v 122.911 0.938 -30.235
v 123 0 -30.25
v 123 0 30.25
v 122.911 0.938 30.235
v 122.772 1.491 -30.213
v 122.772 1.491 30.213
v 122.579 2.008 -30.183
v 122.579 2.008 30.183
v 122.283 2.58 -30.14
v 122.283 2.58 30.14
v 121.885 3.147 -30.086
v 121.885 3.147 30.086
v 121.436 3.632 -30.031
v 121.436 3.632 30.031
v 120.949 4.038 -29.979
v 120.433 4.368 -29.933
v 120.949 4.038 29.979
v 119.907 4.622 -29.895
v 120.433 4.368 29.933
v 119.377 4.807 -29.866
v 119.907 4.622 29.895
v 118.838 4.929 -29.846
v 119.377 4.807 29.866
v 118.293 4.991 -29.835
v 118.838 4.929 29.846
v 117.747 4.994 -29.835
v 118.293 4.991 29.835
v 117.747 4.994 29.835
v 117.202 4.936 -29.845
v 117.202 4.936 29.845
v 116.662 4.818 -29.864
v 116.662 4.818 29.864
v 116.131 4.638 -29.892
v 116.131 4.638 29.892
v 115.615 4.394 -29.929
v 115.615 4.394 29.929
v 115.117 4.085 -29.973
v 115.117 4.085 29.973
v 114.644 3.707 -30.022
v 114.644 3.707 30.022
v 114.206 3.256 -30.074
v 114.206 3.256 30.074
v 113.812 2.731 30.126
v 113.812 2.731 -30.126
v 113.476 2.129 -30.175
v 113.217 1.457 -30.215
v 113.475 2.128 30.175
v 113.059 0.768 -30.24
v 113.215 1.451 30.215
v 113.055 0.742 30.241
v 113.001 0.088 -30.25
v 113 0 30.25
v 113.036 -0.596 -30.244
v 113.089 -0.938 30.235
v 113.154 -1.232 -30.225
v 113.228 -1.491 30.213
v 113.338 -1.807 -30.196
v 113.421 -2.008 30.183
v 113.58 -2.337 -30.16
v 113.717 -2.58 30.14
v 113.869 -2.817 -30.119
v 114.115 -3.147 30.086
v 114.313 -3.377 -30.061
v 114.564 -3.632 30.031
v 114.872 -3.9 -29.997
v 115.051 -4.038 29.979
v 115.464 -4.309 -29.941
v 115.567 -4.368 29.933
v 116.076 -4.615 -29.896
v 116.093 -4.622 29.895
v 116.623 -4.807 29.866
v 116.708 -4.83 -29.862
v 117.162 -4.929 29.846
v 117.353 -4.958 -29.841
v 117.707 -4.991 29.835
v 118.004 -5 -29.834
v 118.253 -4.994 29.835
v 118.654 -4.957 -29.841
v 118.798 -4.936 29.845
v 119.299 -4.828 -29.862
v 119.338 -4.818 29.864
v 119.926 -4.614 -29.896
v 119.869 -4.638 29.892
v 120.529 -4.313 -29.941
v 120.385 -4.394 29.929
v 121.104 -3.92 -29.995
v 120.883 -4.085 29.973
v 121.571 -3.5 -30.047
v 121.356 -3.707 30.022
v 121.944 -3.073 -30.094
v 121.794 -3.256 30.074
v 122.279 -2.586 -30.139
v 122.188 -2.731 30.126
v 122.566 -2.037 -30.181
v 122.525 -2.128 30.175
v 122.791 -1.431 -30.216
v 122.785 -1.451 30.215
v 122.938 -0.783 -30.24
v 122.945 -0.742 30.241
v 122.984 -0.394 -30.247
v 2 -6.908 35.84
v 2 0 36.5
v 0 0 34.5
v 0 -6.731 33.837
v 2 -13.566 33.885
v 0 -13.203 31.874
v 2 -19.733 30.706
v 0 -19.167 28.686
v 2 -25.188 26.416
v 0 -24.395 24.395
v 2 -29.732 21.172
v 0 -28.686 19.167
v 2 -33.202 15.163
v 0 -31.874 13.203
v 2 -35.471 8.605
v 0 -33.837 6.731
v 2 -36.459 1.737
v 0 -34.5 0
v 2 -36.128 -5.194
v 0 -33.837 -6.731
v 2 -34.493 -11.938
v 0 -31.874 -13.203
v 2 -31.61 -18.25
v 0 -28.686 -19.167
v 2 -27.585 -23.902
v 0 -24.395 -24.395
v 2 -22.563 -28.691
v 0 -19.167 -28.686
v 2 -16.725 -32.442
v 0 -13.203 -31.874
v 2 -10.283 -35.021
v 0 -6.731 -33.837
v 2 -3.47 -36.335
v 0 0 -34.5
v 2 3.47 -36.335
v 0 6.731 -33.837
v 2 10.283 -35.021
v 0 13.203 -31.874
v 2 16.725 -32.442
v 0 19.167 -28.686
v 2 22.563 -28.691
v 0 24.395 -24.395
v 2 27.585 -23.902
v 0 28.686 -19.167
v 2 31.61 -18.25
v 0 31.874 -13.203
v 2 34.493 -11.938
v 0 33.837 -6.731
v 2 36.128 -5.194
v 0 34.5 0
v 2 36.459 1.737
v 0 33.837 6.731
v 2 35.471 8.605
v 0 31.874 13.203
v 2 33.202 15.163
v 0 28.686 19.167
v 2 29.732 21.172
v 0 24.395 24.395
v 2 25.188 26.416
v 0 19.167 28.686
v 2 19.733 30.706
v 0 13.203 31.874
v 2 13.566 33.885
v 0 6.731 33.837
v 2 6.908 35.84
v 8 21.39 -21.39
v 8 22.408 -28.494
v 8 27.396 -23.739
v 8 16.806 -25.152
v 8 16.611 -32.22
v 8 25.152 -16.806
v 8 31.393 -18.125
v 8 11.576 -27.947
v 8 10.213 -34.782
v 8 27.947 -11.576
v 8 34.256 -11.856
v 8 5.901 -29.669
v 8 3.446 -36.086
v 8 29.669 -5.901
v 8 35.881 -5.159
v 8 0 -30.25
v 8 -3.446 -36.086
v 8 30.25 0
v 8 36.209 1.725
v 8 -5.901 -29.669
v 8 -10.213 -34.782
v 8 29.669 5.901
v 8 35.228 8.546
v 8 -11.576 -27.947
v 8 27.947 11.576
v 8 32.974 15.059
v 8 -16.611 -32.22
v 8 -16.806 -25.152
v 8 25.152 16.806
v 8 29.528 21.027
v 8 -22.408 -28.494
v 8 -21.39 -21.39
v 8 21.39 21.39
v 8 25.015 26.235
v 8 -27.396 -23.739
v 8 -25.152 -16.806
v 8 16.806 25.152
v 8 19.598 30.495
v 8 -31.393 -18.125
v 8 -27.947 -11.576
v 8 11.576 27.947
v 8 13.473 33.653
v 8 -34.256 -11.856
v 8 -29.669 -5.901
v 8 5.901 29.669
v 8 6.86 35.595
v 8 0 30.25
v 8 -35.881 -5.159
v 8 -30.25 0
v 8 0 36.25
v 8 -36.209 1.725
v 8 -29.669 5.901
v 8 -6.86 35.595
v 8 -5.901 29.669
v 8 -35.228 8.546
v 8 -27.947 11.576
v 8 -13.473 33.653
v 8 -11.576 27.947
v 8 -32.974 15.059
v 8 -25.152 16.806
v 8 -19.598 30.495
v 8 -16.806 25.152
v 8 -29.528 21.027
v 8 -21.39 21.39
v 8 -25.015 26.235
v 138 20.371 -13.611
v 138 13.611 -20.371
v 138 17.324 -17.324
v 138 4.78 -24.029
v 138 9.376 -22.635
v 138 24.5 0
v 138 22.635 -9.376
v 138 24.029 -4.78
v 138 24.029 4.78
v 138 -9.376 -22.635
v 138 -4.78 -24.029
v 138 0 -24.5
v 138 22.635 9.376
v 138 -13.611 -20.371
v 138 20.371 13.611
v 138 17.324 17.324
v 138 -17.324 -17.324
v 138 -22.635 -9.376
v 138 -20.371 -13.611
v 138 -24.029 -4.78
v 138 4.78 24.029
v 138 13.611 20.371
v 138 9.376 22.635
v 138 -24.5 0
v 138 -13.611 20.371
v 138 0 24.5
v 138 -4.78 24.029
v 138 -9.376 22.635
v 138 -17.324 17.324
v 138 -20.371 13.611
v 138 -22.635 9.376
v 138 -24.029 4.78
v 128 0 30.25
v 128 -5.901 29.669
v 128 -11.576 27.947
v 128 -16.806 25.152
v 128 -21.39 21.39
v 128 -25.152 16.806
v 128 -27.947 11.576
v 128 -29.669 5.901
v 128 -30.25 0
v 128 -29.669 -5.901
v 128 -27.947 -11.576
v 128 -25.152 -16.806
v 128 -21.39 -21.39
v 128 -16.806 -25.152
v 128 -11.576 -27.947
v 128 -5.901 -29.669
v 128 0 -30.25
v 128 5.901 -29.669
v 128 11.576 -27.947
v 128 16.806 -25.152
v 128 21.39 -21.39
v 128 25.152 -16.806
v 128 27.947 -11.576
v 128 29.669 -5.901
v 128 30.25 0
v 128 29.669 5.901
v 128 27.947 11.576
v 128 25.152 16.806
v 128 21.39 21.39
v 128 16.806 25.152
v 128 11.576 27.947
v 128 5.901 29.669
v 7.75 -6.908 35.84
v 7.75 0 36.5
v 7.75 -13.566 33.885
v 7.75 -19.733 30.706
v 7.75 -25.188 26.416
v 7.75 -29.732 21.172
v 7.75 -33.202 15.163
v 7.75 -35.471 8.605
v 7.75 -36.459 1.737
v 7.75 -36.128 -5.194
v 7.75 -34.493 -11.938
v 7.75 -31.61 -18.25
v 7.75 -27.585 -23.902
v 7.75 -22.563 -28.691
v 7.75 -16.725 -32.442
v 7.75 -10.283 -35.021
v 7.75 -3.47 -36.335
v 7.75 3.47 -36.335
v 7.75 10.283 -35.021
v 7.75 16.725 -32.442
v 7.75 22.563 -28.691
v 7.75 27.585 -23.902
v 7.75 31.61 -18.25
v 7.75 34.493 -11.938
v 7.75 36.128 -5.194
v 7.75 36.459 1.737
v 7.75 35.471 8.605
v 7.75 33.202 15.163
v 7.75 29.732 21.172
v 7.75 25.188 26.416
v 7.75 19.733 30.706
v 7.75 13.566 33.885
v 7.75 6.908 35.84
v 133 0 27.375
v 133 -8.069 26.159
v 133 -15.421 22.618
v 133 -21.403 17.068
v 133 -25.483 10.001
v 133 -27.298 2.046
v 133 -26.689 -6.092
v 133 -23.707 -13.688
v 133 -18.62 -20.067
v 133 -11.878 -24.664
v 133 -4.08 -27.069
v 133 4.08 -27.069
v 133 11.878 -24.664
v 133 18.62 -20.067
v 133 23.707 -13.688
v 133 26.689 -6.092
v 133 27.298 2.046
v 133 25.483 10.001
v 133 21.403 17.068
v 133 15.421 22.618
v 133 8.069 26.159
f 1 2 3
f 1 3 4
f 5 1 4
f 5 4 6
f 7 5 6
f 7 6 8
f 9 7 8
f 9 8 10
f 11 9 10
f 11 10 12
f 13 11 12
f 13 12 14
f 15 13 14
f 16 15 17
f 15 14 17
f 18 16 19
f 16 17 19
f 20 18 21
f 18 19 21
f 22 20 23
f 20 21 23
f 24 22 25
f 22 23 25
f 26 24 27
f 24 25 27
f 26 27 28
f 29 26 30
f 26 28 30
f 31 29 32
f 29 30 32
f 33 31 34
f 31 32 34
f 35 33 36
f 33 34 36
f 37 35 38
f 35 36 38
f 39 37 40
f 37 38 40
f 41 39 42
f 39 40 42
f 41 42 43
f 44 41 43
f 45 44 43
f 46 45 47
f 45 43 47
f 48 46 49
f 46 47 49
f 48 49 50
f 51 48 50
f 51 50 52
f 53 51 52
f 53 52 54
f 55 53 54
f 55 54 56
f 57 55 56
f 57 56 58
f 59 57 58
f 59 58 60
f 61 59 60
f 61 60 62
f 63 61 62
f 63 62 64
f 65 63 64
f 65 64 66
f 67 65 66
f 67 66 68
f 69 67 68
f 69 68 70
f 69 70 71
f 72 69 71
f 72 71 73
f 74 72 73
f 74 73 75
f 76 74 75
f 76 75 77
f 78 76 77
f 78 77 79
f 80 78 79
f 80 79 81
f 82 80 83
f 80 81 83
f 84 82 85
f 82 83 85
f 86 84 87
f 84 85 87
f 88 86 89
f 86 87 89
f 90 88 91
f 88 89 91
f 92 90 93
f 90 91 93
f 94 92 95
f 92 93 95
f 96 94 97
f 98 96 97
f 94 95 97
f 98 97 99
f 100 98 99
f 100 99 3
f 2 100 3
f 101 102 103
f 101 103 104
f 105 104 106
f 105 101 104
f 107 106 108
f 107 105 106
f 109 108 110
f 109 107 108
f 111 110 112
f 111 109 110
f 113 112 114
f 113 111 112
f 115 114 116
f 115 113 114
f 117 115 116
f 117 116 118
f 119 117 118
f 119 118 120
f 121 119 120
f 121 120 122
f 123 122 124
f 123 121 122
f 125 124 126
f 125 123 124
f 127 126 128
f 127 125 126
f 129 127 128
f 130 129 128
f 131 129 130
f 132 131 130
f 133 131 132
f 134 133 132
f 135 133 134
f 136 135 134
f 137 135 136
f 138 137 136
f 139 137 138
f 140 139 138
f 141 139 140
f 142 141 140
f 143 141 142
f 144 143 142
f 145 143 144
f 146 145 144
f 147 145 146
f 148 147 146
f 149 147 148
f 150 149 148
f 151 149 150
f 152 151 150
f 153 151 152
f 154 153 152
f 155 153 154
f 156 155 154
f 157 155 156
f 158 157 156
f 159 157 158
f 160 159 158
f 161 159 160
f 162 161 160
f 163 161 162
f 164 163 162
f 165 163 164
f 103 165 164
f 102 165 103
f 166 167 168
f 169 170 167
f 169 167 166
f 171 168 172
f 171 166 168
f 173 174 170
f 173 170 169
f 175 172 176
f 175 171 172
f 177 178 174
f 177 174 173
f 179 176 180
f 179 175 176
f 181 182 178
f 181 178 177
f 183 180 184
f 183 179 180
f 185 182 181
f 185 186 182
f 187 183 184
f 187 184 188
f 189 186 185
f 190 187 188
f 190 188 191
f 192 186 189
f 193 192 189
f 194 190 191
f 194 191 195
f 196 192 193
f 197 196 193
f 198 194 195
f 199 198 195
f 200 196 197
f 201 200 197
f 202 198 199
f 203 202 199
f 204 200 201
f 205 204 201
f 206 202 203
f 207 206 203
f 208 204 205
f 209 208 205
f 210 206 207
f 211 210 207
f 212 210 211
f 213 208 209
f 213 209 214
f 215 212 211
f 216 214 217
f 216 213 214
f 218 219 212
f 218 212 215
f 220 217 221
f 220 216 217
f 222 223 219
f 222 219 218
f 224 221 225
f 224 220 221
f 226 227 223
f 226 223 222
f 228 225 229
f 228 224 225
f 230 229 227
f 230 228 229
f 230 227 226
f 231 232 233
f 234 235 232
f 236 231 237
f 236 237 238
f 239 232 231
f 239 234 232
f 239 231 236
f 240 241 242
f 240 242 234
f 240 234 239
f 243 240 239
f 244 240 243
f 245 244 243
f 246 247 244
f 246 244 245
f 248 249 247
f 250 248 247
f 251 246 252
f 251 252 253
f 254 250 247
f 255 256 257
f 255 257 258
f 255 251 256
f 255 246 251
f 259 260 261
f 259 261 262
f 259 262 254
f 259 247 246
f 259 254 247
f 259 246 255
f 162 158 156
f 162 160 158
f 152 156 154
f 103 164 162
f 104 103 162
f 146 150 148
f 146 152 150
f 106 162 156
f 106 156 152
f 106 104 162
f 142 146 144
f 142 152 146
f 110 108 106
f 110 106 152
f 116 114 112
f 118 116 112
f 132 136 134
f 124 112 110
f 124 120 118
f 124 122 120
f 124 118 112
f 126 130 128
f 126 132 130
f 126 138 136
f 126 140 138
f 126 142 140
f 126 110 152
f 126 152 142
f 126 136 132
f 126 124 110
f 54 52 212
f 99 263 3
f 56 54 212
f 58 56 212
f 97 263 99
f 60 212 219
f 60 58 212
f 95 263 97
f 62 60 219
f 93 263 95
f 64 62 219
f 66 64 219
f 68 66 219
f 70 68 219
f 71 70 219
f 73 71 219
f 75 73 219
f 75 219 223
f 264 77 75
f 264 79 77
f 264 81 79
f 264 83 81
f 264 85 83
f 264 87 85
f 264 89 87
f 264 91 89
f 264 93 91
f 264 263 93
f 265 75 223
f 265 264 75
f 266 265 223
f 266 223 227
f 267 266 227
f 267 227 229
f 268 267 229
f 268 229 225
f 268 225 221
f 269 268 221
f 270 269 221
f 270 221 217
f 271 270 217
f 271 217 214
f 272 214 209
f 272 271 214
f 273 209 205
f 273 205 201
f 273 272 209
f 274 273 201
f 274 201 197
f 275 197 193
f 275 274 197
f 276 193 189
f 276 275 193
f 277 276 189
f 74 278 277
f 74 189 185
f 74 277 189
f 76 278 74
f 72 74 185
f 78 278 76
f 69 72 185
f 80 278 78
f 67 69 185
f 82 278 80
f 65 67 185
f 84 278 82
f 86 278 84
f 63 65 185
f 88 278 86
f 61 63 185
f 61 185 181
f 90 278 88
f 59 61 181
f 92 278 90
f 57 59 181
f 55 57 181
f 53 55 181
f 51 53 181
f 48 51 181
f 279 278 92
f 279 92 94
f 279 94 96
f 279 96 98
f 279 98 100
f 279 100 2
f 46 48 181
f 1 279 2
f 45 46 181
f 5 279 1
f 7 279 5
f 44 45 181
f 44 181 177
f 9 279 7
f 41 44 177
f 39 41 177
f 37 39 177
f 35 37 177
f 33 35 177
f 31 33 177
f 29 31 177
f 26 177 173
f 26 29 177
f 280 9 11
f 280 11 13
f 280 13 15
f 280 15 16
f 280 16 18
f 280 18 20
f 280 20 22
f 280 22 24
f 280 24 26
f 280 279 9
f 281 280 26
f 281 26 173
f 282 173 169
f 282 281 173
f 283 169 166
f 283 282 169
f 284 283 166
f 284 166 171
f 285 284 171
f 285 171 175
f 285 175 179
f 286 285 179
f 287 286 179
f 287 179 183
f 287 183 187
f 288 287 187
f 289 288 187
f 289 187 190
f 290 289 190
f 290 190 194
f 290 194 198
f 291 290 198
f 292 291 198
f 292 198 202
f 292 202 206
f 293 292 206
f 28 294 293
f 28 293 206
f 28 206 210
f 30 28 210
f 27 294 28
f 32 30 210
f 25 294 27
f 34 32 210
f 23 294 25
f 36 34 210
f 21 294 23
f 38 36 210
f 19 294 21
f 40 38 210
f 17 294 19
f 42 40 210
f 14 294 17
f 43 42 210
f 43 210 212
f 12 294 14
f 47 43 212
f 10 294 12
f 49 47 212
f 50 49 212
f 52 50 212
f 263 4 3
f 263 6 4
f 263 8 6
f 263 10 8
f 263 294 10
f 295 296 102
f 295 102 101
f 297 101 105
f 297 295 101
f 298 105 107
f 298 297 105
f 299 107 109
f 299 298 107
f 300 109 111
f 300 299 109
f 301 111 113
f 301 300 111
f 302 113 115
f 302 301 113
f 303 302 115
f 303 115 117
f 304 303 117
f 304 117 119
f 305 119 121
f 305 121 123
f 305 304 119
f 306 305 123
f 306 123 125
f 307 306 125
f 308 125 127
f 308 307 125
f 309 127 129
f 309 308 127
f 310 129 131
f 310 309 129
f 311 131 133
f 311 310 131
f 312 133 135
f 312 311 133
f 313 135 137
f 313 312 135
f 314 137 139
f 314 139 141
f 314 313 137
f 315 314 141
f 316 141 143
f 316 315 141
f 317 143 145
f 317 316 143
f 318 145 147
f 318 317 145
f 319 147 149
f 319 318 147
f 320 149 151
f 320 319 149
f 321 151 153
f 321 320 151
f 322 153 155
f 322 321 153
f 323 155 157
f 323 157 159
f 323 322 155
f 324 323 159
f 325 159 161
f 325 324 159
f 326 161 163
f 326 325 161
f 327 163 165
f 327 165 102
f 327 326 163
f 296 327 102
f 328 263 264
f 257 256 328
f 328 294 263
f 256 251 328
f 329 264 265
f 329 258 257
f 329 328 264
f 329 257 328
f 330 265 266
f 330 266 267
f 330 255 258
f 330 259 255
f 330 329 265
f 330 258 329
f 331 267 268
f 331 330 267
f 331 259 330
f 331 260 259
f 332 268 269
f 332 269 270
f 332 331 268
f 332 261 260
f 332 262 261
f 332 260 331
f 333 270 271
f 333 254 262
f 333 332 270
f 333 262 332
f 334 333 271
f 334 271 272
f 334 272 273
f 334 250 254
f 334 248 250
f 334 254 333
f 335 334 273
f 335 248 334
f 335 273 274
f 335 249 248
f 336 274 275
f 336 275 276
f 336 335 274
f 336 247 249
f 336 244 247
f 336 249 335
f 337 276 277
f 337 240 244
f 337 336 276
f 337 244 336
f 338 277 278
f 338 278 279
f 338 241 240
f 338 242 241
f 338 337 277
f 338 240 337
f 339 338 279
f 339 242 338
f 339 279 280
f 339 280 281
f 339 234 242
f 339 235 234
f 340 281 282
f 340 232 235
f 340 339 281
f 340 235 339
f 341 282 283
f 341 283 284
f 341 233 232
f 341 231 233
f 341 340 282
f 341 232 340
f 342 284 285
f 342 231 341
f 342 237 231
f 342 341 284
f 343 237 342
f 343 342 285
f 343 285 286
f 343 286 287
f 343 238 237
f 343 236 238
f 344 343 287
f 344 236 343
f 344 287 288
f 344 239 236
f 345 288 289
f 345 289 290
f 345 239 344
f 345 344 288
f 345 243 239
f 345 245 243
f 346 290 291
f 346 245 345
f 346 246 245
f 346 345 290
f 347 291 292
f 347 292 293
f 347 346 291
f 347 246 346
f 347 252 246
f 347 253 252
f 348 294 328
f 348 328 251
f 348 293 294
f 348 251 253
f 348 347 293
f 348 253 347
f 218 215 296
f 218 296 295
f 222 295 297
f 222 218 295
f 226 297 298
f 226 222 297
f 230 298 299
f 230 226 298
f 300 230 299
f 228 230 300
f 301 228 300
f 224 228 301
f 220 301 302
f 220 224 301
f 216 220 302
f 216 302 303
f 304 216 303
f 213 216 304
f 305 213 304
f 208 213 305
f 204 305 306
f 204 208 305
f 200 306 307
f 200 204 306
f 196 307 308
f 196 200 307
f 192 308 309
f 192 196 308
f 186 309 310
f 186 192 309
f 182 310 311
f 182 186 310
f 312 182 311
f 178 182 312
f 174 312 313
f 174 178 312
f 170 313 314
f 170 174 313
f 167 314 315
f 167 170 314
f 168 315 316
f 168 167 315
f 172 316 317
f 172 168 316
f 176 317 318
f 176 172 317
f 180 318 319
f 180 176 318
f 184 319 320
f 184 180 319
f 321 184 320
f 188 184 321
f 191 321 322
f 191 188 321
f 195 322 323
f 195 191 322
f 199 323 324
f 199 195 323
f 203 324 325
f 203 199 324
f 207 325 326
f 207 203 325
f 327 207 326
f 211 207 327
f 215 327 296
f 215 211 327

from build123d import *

# Parameters (mm, degrees)
CHAMFER_1_SIZE      = 2
SKETCH_2_R          = 5
CUT_EXTRUDE_1_DEPTH = 162.952153428
CHAMFER_2_SIZE      = 0.25


with BuildPart() as part:
    # 草图1 → 旋转1 (revolve)
    with BuildSketch(Plane.XY, mode=Mode.PRIVATE) as revolve_1_sk:
        Polygon((0, 0), (0, 36.5), (8, 36.5), (8, 30.25), (128, 30.25), (138, 24.5), (138, 0), align=None)
    revolve(revolve_1_sk.sketch.rotate(Axis((0, 0, 0), (1, 0, 0)), 90), axis=Axis((0, 0, 0), (1, 0, 0)))

    # 倒角1
    chamfer_1_edges = [part.edges().sort_by_distance(p)[0] for p in [
        (0, 0, -36.5),
    ]]
    chamfer(chamfer_1_edges, length=CHAMFER_1_SIZE)

    # 草图2 → 切除-拉伸1 (cut, through all)
    with BuildSketch(Plane.XY.offset(40)):
        with Locations((118, 0)):
            Circle(SKETCH_2_R)
    extrude(amount=-CUT_EXTRUDE_1_DEPTH, mode=Mode.SUBTRACT)

    # 倒角2
    chamfer_2_edges = [part.edges().sort_by_distance(p)[0] for p in [
        (8, 0, -36.5),
    ]]
    chamfer(chamfer_2_edges, length=CHAMFER_2_SIZE)


solid = part.part
